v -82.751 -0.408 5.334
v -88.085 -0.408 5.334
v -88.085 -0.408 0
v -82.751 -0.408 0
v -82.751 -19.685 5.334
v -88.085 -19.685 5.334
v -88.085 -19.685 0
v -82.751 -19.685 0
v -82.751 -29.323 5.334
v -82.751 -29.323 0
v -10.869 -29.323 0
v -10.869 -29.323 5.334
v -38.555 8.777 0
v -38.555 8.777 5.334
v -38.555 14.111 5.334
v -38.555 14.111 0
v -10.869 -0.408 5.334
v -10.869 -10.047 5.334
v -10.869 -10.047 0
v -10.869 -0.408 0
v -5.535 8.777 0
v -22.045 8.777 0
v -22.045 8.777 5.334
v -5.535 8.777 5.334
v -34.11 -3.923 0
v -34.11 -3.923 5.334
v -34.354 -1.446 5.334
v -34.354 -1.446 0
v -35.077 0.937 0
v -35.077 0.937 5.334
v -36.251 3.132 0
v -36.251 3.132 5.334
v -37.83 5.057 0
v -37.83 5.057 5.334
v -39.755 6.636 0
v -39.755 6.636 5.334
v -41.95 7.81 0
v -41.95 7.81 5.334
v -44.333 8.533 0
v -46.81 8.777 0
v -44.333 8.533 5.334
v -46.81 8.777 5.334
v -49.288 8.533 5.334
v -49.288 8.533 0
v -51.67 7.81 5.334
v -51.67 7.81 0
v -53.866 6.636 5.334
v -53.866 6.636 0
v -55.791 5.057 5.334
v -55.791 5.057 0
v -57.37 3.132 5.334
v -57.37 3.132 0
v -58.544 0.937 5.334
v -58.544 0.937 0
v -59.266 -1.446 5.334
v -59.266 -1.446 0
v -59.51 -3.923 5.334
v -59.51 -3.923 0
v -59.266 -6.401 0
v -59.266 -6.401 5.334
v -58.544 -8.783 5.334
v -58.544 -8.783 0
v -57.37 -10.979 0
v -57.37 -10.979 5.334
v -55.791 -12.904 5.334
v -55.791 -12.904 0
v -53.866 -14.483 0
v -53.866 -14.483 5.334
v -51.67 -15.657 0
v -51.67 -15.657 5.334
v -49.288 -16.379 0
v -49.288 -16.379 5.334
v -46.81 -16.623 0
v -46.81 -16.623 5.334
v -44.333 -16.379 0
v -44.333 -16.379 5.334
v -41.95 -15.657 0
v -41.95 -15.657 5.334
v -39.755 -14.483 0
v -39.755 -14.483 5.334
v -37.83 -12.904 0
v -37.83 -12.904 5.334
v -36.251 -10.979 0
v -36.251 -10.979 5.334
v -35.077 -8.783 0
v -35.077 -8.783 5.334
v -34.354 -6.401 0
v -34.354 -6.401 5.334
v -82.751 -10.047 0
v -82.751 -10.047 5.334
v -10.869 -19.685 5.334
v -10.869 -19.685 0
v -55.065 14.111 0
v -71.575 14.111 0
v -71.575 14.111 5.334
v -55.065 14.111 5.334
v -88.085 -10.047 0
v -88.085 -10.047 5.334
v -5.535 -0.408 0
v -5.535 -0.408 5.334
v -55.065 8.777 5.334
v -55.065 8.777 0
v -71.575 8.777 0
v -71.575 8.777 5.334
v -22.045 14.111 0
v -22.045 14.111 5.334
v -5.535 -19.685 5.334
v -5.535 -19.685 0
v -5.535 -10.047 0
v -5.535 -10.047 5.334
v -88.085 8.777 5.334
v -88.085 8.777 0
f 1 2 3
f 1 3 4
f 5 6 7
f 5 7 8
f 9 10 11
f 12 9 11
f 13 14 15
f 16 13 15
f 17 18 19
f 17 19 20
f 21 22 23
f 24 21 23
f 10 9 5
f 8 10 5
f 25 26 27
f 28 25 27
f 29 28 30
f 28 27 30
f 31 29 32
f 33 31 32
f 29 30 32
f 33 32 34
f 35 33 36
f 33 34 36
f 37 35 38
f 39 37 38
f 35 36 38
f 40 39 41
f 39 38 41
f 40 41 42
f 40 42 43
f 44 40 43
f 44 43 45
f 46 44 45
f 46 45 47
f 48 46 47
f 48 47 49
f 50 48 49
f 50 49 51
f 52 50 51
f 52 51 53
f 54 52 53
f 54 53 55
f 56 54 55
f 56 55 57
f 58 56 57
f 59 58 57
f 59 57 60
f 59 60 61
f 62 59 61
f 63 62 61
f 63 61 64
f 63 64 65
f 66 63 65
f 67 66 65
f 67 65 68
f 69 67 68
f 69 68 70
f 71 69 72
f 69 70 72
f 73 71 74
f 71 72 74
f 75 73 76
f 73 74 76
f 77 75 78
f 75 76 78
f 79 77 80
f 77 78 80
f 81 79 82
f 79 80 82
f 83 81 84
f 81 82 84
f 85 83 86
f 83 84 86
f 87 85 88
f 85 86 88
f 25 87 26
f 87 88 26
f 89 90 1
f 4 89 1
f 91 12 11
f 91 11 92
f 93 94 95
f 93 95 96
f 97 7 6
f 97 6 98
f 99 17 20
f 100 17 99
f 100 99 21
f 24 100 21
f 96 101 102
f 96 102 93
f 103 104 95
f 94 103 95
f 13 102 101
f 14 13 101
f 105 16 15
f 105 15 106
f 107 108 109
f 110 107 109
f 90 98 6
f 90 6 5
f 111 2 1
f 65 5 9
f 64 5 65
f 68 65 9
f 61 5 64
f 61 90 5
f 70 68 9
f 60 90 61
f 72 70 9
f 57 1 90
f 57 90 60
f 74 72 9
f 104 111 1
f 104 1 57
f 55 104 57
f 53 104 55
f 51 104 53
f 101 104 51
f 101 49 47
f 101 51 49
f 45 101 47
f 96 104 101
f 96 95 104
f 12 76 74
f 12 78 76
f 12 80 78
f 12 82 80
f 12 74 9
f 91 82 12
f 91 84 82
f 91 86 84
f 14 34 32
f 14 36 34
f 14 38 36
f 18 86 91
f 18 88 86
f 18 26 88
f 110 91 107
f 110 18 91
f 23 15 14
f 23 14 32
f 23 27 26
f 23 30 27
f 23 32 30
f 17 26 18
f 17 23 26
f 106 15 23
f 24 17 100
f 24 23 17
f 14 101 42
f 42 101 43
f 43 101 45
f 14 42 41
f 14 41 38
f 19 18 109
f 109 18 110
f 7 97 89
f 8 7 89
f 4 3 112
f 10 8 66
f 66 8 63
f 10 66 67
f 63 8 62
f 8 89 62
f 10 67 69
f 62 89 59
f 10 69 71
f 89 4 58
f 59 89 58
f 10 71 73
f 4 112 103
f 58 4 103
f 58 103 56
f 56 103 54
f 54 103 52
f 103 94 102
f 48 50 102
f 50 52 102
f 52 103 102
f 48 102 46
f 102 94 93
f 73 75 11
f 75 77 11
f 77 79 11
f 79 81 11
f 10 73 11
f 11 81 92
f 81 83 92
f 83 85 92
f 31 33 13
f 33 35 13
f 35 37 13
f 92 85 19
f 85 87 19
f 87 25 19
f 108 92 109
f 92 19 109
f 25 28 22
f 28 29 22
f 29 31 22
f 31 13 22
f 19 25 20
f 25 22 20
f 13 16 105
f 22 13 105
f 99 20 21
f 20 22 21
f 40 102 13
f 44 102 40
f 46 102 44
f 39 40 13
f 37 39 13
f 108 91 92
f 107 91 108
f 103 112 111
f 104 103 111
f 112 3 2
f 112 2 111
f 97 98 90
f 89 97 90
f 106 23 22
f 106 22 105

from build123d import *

# Parameters (mm, degrees)
SKETCH1_W                = 82.55
SKETCH1_H                = 43.434
BOSS_EXTRUDE1_DEPTH      = 5.334
CUT_EXTRUDE1_START       = -88.085249325
CUT_EXTRUDE1_OUTLINE_W   = 5.334
CUT_EXTRUDE1_OUTLINE_H   = 5.334
CUT_EXTRUDE1_DEPTH       = 16.51
CUT_EXTRUDE1_START_2     = -55.065249325
CUT_EXTRUDE1_2_OUTLINE_W = 5.334
CUT_EXTRUDE1_2_OUTLINE_H = 5.334
CUT_EXTRUDE1_2_DEPTH     = 16.51
CUT_EXTRUDE1_START_3     = -22.045249325
CUT_EXTRUDE1_3_OUTLINE_W = 5.334
CUT_EXTRUDE1_3_OUTLINE_H = 5.334
CUT_EXTRUDE1_3_DEPTH     = 16.51
SKETCH3_W                = 5.334
SKETCH3_H                = 9.638319844
SKETCH3_H_2              = 9.638319843
CUT_EXTRUDE2_DEPTH       = 93.990910348
SKETCH4_R                = 12.7
CUT_EXTRUDE3_DEPTH       = 93.990910348


# Read off the part's stored shape, not the designer's step: Cut-Extrude1
with BuildPart() as part:
    # Sketch1 → Boss-Extrude1 (new body)
    with BuildSketch(Plane.XY):
        with Locations((-46.810249325, -7.606142782)):
            Rectangle(SKETCH1_W, SKETCH1_H)
    extrude(amount=BOSS_EXTRUDE1_DEPTH)

    # Cut-Extrude1 outline → Cut-Extrude1 (cut)
    with BuildSketch(Plane.YZ.offset(CUT_EXTRUDE1_START)):
        with Locations((11.443857218, 2.667)):
            Rectangle(CUT_EXTRUDE1_OUTLINE_W, CUT_EXTRUDE1_OUTLINE_H)
    extrude(amount=CUT_EXTRUDE1_DEPTH, mode=Mode.SUBTRACT)

    # Cut-Extrude1 2 outline → Cut-Extrude1 2 (cut)
    with BuildSketch(Plane.YZ.offset(CUT_EXTRUDE1_START_2)):
        with Locations((11.443857218, 2.667)):
            Rectangle(CUT_EXTRUDE1_2_OUTLINE_W, CUT_EXTRUDE1_2_OUTLINE_H)
    extrude(amount=CUT_EXTRUDE1_2_DEPTH, mode=Mode.SUBTRACT)

    # Cut-Extrude1 3 outline → Cut-Extrude1 3 (cut)
    with BuildSketch(Plane.YZ.offset(CUT_EXTRUDE1_START_3)):
        with Locations((11.443857218, 2.667)):
            Rectangle(CUT_EXTRUDE1_3_OUTLINE_W, CUT_EXTRUDE1_3_OUTLINE_H)
    extrude(amount=CUT_EXTRUDE1_3_DEPTH, mode=Mode.SUBTRACT)

    # Sketch3 → Cut-Extrude2 (cut, through all)
    with BuildSketch(Plane.XY.offset(5.334)):
        with Locations((-85.418249325, -24.50398286)):
            Rectangle(SKETCH3_W, SKETCH3_H)
        with Locations((-85.418249325, -5.227343173)):
            Rectangle(SKETCH3_W, SKETCH3_H_2)
        with Locations((-8.202249325, -24.50398286)):
            Rectangle(SKETCH3_W, SKETCH3_H)
        with Locations((-8.202249325, -5.227343173)):
            Rectangle(SKETCH3_W, SKETCH3_H_2)
    extrude(amount=-CUT_EXTRUDE2_DEPTH, mode=Mode.SUBTRACT)

    # Sketch4 → Cut-Extrude3 (cut, through all)
    with BuildSketch(Plane.XY.offset(5.334)):
        with Locations((-46.810249325, -3.923396782)):
            Circle(SKETCH4_R)
    extrude(amount=-CUT_EXTRUDE3_DEPTH, mode=Mode.SUBTRACT)


solid = part.part
